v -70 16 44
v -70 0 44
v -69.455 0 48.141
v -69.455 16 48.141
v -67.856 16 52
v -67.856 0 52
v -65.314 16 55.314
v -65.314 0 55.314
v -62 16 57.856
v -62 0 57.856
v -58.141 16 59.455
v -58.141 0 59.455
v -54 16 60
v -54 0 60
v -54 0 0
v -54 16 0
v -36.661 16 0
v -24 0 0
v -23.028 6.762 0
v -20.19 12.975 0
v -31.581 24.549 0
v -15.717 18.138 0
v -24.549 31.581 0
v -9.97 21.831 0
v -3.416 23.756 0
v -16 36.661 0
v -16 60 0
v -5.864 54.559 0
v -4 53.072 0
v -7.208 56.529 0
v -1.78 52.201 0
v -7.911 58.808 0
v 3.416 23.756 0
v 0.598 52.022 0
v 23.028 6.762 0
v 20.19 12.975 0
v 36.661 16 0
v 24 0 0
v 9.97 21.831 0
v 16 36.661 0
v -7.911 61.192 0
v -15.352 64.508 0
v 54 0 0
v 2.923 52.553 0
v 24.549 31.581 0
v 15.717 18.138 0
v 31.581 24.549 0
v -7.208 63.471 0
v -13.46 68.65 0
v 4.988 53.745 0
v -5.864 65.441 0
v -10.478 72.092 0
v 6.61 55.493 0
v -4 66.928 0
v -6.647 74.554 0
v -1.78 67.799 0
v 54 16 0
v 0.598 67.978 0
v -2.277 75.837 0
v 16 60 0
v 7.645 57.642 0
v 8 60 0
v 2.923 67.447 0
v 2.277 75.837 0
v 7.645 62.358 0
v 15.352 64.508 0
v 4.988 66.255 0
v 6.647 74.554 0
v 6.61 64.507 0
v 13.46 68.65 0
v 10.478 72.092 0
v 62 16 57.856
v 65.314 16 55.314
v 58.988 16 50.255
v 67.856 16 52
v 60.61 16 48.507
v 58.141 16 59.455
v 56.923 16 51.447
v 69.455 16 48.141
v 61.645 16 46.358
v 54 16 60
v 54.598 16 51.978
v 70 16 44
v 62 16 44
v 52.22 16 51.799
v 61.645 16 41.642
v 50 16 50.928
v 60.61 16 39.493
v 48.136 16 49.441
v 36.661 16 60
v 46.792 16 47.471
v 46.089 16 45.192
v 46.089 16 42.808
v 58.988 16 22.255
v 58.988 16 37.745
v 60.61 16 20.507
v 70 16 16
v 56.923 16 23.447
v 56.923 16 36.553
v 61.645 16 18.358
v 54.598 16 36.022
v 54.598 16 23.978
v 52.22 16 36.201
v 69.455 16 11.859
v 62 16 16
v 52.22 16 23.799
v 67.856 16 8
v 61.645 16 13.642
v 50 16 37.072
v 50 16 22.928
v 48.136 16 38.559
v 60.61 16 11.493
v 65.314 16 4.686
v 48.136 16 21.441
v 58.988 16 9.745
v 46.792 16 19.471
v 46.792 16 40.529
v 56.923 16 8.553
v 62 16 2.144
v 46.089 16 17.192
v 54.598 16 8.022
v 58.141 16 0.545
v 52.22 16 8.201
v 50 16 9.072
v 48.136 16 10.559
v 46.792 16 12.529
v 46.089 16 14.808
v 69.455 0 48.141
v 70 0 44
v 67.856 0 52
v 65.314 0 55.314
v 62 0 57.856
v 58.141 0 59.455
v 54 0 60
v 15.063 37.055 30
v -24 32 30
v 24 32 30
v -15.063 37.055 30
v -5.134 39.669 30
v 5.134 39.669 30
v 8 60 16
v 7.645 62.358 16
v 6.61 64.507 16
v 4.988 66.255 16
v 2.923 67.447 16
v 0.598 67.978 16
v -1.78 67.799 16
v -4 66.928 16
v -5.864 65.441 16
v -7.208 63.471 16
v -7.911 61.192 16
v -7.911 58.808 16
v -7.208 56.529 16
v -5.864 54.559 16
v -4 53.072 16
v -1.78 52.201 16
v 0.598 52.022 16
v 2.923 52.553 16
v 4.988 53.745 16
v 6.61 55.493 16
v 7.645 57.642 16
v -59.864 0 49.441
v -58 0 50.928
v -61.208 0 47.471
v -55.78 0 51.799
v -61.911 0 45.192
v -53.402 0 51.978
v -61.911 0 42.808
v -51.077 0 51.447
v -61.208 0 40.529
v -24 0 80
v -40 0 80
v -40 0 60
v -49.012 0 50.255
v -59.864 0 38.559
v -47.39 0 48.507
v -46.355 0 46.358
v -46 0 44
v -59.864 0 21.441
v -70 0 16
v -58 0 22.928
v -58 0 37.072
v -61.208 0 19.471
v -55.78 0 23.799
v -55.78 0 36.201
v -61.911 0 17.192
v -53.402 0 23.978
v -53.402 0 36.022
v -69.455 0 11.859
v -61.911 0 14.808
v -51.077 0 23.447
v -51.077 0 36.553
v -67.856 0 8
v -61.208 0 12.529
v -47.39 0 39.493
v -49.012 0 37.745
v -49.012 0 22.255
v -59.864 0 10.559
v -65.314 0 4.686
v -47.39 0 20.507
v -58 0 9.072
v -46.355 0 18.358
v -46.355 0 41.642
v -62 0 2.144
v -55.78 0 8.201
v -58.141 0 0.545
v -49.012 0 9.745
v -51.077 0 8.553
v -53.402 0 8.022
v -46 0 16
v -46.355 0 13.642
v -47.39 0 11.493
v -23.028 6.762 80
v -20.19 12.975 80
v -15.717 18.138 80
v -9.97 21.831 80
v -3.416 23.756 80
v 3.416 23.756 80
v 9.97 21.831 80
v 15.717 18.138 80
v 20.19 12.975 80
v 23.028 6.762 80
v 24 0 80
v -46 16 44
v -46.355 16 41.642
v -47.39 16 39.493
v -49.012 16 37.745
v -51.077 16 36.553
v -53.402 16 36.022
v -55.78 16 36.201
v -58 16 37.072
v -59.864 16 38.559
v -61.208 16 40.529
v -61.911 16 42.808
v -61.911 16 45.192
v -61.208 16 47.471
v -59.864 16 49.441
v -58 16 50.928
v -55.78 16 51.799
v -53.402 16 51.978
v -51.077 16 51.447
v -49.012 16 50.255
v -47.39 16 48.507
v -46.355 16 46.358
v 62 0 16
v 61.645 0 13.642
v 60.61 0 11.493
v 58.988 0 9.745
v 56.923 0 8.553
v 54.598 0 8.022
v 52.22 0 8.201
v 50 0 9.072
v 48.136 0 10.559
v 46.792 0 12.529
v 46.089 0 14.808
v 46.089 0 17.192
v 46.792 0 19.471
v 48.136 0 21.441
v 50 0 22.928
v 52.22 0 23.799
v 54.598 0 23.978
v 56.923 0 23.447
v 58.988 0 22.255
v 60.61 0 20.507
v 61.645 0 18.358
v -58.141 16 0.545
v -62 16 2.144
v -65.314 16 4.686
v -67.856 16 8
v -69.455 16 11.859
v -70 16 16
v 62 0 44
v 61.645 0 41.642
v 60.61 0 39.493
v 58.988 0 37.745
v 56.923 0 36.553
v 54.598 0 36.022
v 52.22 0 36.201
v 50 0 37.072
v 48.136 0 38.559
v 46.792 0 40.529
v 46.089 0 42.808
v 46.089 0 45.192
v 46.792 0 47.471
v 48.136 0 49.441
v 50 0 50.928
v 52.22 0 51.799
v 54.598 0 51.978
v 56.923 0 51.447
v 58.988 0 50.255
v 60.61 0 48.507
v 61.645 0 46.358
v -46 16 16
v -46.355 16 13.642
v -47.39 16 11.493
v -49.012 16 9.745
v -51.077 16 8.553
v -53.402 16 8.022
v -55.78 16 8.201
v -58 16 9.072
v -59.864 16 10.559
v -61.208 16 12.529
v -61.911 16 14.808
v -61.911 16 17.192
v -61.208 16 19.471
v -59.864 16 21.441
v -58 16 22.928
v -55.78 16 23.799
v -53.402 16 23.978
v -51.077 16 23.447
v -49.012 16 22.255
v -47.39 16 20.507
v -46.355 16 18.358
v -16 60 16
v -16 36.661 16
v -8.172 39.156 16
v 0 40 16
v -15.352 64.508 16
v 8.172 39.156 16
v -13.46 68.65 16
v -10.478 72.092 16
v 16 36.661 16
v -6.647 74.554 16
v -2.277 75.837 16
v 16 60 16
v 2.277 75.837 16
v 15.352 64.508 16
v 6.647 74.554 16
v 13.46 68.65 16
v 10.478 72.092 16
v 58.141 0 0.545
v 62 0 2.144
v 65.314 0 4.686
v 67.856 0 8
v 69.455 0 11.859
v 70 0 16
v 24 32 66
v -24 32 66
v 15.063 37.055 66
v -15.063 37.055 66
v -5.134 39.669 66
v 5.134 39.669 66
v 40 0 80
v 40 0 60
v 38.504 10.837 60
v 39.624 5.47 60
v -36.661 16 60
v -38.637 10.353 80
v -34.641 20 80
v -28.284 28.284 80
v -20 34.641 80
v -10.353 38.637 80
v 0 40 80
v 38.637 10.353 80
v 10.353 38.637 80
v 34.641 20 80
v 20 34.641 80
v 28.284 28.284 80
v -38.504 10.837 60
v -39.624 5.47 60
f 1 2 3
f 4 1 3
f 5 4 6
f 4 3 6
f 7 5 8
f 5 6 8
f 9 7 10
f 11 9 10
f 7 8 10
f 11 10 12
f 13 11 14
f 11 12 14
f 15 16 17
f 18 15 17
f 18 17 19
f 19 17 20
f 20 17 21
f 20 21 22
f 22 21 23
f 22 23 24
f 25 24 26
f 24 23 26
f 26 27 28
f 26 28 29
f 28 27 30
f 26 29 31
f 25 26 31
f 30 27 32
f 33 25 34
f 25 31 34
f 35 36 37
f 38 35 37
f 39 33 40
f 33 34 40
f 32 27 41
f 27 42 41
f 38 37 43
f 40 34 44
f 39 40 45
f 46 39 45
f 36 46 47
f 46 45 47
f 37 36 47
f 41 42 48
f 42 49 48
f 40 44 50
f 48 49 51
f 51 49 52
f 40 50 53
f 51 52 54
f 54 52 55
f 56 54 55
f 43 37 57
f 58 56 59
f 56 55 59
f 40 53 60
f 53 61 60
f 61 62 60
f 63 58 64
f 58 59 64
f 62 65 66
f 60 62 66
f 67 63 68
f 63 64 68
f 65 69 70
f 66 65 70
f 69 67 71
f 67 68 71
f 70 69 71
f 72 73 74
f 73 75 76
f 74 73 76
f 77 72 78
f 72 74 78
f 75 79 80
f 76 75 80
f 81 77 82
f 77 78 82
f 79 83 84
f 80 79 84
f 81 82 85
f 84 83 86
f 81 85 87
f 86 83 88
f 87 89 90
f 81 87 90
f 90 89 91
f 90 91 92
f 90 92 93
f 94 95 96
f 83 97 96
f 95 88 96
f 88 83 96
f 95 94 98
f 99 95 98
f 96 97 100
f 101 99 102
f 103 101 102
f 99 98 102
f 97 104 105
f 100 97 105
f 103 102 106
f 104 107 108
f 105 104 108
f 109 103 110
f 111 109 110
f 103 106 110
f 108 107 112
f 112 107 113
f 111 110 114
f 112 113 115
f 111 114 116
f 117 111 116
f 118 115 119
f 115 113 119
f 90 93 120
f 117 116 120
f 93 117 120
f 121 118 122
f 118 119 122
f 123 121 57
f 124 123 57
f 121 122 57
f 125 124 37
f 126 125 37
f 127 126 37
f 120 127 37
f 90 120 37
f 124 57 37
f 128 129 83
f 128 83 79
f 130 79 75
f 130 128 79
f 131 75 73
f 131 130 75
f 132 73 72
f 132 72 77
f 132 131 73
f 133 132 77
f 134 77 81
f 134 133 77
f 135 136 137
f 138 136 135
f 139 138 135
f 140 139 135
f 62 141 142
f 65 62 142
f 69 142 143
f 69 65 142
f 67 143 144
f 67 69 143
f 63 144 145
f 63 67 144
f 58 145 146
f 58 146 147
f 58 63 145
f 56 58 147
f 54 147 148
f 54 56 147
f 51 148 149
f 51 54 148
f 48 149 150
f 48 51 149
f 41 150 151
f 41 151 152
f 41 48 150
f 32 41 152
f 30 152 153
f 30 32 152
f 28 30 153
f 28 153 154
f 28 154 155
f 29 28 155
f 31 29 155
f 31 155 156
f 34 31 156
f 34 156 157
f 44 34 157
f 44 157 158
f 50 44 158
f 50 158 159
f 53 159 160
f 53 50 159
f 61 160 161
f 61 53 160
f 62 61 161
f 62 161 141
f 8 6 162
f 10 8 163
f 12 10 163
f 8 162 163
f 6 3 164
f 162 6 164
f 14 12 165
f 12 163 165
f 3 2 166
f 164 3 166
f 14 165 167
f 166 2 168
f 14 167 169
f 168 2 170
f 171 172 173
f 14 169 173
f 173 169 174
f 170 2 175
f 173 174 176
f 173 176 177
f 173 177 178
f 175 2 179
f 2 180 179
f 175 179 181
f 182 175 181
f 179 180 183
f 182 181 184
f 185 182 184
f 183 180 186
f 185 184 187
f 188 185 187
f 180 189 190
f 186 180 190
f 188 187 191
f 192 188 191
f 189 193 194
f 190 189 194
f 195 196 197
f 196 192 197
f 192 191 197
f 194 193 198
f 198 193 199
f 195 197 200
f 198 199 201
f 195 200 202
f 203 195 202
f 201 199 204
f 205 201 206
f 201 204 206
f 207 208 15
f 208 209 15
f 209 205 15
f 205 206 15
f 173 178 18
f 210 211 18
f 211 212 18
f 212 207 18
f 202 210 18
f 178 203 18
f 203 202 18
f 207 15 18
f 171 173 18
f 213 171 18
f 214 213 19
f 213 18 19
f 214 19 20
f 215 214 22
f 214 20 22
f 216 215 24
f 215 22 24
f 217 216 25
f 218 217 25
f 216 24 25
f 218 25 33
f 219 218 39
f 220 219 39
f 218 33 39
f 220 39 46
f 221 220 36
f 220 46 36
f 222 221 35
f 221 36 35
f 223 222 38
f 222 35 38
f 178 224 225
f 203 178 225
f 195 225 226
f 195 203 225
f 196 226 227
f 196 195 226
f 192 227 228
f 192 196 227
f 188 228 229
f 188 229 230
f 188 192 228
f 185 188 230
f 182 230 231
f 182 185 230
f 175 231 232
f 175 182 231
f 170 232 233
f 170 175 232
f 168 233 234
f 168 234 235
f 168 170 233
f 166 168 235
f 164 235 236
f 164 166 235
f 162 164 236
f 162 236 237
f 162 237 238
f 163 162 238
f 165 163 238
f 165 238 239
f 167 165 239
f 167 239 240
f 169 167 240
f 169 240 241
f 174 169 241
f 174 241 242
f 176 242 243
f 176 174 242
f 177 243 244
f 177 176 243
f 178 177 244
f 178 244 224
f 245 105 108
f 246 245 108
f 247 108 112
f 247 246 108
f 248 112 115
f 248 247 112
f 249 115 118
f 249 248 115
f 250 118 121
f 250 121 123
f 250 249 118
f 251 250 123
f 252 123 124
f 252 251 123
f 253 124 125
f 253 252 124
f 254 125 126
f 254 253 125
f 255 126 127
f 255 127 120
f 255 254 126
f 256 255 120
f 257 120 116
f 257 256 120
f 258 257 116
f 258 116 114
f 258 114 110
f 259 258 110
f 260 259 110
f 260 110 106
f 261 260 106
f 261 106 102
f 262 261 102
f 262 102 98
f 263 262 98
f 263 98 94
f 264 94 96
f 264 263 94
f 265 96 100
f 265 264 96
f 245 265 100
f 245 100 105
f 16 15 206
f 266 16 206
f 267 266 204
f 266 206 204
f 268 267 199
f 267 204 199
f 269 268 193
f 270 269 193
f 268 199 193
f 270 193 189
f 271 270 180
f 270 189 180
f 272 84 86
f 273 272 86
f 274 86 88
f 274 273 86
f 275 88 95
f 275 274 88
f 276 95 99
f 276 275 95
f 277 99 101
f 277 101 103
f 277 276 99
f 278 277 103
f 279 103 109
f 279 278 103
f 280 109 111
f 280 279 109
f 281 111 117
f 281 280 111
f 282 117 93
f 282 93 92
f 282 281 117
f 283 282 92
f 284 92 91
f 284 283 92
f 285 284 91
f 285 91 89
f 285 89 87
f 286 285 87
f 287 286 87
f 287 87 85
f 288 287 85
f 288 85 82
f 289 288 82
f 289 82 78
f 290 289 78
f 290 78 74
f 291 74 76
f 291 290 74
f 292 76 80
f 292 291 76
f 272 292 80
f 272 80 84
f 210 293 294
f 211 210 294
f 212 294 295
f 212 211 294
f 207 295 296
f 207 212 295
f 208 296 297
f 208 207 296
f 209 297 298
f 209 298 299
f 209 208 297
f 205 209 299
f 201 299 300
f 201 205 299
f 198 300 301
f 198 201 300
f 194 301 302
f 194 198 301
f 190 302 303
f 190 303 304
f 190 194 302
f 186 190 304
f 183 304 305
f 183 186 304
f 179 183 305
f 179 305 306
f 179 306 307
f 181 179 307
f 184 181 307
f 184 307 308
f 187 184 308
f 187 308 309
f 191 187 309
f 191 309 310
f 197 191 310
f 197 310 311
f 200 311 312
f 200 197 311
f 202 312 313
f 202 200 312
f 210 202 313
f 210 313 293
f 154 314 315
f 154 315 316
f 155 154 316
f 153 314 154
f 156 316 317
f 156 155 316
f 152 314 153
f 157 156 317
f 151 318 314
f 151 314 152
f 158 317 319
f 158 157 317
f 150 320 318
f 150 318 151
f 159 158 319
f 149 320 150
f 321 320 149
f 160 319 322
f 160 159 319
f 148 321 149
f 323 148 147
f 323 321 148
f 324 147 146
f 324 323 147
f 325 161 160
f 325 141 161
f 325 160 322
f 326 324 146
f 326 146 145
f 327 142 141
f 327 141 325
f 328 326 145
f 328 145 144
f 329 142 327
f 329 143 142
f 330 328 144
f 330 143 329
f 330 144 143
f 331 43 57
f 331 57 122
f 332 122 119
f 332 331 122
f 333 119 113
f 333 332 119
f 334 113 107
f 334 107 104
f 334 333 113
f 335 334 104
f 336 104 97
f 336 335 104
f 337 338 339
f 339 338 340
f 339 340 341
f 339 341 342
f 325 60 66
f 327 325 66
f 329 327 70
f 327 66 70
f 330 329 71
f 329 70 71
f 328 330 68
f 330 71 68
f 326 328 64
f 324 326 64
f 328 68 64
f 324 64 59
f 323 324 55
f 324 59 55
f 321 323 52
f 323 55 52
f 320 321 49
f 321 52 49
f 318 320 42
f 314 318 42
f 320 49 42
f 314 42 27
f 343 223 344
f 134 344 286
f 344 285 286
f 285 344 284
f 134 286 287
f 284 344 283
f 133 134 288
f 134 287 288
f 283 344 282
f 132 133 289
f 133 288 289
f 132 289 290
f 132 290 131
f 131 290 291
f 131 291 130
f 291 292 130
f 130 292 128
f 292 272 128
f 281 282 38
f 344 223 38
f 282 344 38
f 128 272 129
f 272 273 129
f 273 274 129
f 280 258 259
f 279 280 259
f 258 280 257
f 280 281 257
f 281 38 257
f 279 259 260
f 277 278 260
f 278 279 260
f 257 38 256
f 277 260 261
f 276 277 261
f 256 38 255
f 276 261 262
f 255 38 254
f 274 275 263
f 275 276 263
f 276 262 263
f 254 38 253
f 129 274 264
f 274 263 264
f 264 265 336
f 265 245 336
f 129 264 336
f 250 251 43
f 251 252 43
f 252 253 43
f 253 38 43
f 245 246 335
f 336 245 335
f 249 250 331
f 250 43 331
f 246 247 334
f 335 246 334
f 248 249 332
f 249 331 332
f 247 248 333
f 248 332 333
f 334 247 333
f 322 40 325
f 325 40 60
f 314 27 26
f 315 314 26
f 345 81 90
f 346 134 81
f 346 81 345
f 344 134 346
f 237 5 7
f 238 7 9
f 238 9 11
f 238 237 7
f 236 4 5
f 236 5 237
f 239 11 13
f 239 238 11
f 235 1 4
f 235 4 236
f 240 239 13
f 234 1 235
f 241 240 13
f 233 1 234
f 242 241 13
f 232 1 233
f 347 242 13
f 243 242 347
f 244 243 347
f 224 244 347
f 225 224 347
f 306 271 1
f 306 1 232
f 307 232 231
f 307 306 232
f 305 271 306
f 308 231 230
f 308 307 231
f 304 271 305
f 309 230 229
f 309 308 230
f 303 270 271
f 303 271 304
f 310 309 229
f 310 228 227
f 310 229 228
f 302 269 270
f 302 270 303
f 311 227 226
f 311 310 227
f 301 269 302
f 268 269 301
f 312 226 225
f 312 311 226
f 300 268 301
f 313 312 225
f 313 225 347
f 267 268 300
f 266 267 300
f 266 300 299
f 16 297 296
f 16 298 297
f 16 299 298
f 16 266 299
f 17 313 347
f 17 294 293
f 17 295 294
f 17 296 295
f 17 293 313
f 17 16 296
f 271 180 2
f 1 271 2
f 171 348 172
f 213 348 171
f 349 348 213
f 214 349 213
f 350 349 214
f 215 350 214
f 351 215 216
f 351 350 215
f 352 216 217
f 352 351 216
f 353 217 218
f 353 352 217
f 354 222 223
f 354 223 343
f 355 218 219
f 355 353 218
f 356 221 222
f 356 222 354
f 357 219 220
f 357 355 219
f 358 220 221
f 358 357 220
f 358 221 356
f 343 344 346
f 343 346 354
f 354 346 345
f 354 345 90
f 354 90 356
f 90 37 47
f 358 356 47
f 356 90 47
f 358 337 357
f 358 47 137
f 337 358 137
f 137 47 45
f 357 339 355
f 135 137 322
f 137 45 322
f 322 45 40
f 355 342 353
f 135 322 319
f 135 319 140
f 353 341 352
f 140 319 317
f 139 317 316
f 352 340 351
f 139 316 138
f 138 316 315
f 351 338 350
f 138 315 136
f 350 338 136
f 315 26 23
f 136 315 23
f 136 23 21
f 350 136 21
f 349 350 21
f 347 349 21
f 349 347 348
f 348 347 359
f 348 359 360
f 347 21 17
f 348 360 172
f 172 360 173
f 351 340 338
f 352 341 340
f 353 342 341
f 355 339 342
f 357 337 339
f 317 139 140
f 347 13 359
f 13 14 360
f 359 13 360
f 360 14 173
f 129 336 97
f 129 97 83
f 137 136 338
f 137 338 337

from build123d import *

# Parameters (mm, degrees)
EXTRUDE_1_DEPTH     = 80
SKETCH_3_R          = 8
EXTRUDE_2_DEPTH     = 16
SKETCH_4_W          = 84.547176069
SKETCH_4_H          = 36
CUT_EXTRUDE_1_DEPTH = 33
SKETCH_5_R          = 8
EXTRUDE_3_DEPTH     = 16


with BuildPart() as part:
    # 草图2 → 凸台-拉伸1 (new body)
    with BuildSketch(Plane.XY):
        with BuildLine():
            Line((-40, 0), (-24, 0))
            ThreePointArc((-24, 0), (0, 24), (24, 0))
            Line((24, 0), (40, 0))
            ThreePointArc((40, 0), (0, 40), (-40, 0))
        make_face()
    extrude(amount=EXTRUDE_1_DEPTH)

    # 草图3 → 凸台-拉伸2 (add)
    with BuildSketch(Plane(origin=(0, 0, 0), x_dir=(1, 0, 0), z_dir=(0, 1, 0))):
        with BuildLine():
            Line((32.951730358, 0), (54, 0))
            ThreePointArc((54, 0), (65.313708499, -4.686291501), (70, -16))
            Line((70, -16), (70, -44))
            ThreePointArc((70, -44), (65.313708499, -55.313708499), (54, -60))
            Line((54, -60), (32.951730358, -60))
            Line((32.951730358, -60), (32.951730358, 0))
        make_face()
        with Locations((54, -16)):
            Circle(SKETCH_3_R, mode=Mode.SUBTRACT)
        with Locations((54, -44)):
            Circle(SKETCH_3_R, mode=Mode.SUBTRACT)
        with BuildLine():
            Line((-32.951730358, -60), (-32.951730358, 0))
            Line((-32.951730358, 0), (-54, 0))
            ThreePointArc((-54, 0), (-65.313708499, -4.686291501), (-70, -16))
            Line((-70, -16), (-70, -44))
            ThreePointArc((-70, -44), (-65.313708499, -55.313708499), (-54, -60))
            Line((-54, -60), (-32.951730358, -60))
        make_face()
        with Locations((-54, -44)):
            Circle(SKETCH_3_R, mode=Mode.SUBTRACT)
        with Locations((-54, -16)):
            Circle(SKETCH_3_R, mode=Mode.SUBTRACT)
    extrude(amount=EXTRUDE_2_DEPTH)

    # 草图4 → 切除-拉伸1 (cut)
    with BuildSketch(Plane(origin=(0, 32, 0), x_dir=(1, 0, 0), z_dir=(0, 1, 0))):
        with Locations((0.989381847, -48)):
            Rectangle(SKETCH_4_W, SKETCH_4_H)
    extrude(amount=CUT_EXTRUDE_1_DEPTH, mode=Mode.SUBTRACT)

    # 草图5 → 凸台-拉伸3 (add)
    with BuildSketch(Plane.XY):
        with BuildLine():
            Line((-16, 60), (-16, 36.66060556))
            Line((-16, 36.66060556), (16, 36.66060556))
            Line((16, 36.66060556), (16, 60))
            ThreePointArc((16, 60), (0, 76), (-16, 60))
        make_face()
        with Locations((0, 60)):
            Circle(SKETCH_5_R, mode=Mode.SUBTRACT)
    extrude(amount=EXTRUDE_3_DEPTH)


solid = part.part
